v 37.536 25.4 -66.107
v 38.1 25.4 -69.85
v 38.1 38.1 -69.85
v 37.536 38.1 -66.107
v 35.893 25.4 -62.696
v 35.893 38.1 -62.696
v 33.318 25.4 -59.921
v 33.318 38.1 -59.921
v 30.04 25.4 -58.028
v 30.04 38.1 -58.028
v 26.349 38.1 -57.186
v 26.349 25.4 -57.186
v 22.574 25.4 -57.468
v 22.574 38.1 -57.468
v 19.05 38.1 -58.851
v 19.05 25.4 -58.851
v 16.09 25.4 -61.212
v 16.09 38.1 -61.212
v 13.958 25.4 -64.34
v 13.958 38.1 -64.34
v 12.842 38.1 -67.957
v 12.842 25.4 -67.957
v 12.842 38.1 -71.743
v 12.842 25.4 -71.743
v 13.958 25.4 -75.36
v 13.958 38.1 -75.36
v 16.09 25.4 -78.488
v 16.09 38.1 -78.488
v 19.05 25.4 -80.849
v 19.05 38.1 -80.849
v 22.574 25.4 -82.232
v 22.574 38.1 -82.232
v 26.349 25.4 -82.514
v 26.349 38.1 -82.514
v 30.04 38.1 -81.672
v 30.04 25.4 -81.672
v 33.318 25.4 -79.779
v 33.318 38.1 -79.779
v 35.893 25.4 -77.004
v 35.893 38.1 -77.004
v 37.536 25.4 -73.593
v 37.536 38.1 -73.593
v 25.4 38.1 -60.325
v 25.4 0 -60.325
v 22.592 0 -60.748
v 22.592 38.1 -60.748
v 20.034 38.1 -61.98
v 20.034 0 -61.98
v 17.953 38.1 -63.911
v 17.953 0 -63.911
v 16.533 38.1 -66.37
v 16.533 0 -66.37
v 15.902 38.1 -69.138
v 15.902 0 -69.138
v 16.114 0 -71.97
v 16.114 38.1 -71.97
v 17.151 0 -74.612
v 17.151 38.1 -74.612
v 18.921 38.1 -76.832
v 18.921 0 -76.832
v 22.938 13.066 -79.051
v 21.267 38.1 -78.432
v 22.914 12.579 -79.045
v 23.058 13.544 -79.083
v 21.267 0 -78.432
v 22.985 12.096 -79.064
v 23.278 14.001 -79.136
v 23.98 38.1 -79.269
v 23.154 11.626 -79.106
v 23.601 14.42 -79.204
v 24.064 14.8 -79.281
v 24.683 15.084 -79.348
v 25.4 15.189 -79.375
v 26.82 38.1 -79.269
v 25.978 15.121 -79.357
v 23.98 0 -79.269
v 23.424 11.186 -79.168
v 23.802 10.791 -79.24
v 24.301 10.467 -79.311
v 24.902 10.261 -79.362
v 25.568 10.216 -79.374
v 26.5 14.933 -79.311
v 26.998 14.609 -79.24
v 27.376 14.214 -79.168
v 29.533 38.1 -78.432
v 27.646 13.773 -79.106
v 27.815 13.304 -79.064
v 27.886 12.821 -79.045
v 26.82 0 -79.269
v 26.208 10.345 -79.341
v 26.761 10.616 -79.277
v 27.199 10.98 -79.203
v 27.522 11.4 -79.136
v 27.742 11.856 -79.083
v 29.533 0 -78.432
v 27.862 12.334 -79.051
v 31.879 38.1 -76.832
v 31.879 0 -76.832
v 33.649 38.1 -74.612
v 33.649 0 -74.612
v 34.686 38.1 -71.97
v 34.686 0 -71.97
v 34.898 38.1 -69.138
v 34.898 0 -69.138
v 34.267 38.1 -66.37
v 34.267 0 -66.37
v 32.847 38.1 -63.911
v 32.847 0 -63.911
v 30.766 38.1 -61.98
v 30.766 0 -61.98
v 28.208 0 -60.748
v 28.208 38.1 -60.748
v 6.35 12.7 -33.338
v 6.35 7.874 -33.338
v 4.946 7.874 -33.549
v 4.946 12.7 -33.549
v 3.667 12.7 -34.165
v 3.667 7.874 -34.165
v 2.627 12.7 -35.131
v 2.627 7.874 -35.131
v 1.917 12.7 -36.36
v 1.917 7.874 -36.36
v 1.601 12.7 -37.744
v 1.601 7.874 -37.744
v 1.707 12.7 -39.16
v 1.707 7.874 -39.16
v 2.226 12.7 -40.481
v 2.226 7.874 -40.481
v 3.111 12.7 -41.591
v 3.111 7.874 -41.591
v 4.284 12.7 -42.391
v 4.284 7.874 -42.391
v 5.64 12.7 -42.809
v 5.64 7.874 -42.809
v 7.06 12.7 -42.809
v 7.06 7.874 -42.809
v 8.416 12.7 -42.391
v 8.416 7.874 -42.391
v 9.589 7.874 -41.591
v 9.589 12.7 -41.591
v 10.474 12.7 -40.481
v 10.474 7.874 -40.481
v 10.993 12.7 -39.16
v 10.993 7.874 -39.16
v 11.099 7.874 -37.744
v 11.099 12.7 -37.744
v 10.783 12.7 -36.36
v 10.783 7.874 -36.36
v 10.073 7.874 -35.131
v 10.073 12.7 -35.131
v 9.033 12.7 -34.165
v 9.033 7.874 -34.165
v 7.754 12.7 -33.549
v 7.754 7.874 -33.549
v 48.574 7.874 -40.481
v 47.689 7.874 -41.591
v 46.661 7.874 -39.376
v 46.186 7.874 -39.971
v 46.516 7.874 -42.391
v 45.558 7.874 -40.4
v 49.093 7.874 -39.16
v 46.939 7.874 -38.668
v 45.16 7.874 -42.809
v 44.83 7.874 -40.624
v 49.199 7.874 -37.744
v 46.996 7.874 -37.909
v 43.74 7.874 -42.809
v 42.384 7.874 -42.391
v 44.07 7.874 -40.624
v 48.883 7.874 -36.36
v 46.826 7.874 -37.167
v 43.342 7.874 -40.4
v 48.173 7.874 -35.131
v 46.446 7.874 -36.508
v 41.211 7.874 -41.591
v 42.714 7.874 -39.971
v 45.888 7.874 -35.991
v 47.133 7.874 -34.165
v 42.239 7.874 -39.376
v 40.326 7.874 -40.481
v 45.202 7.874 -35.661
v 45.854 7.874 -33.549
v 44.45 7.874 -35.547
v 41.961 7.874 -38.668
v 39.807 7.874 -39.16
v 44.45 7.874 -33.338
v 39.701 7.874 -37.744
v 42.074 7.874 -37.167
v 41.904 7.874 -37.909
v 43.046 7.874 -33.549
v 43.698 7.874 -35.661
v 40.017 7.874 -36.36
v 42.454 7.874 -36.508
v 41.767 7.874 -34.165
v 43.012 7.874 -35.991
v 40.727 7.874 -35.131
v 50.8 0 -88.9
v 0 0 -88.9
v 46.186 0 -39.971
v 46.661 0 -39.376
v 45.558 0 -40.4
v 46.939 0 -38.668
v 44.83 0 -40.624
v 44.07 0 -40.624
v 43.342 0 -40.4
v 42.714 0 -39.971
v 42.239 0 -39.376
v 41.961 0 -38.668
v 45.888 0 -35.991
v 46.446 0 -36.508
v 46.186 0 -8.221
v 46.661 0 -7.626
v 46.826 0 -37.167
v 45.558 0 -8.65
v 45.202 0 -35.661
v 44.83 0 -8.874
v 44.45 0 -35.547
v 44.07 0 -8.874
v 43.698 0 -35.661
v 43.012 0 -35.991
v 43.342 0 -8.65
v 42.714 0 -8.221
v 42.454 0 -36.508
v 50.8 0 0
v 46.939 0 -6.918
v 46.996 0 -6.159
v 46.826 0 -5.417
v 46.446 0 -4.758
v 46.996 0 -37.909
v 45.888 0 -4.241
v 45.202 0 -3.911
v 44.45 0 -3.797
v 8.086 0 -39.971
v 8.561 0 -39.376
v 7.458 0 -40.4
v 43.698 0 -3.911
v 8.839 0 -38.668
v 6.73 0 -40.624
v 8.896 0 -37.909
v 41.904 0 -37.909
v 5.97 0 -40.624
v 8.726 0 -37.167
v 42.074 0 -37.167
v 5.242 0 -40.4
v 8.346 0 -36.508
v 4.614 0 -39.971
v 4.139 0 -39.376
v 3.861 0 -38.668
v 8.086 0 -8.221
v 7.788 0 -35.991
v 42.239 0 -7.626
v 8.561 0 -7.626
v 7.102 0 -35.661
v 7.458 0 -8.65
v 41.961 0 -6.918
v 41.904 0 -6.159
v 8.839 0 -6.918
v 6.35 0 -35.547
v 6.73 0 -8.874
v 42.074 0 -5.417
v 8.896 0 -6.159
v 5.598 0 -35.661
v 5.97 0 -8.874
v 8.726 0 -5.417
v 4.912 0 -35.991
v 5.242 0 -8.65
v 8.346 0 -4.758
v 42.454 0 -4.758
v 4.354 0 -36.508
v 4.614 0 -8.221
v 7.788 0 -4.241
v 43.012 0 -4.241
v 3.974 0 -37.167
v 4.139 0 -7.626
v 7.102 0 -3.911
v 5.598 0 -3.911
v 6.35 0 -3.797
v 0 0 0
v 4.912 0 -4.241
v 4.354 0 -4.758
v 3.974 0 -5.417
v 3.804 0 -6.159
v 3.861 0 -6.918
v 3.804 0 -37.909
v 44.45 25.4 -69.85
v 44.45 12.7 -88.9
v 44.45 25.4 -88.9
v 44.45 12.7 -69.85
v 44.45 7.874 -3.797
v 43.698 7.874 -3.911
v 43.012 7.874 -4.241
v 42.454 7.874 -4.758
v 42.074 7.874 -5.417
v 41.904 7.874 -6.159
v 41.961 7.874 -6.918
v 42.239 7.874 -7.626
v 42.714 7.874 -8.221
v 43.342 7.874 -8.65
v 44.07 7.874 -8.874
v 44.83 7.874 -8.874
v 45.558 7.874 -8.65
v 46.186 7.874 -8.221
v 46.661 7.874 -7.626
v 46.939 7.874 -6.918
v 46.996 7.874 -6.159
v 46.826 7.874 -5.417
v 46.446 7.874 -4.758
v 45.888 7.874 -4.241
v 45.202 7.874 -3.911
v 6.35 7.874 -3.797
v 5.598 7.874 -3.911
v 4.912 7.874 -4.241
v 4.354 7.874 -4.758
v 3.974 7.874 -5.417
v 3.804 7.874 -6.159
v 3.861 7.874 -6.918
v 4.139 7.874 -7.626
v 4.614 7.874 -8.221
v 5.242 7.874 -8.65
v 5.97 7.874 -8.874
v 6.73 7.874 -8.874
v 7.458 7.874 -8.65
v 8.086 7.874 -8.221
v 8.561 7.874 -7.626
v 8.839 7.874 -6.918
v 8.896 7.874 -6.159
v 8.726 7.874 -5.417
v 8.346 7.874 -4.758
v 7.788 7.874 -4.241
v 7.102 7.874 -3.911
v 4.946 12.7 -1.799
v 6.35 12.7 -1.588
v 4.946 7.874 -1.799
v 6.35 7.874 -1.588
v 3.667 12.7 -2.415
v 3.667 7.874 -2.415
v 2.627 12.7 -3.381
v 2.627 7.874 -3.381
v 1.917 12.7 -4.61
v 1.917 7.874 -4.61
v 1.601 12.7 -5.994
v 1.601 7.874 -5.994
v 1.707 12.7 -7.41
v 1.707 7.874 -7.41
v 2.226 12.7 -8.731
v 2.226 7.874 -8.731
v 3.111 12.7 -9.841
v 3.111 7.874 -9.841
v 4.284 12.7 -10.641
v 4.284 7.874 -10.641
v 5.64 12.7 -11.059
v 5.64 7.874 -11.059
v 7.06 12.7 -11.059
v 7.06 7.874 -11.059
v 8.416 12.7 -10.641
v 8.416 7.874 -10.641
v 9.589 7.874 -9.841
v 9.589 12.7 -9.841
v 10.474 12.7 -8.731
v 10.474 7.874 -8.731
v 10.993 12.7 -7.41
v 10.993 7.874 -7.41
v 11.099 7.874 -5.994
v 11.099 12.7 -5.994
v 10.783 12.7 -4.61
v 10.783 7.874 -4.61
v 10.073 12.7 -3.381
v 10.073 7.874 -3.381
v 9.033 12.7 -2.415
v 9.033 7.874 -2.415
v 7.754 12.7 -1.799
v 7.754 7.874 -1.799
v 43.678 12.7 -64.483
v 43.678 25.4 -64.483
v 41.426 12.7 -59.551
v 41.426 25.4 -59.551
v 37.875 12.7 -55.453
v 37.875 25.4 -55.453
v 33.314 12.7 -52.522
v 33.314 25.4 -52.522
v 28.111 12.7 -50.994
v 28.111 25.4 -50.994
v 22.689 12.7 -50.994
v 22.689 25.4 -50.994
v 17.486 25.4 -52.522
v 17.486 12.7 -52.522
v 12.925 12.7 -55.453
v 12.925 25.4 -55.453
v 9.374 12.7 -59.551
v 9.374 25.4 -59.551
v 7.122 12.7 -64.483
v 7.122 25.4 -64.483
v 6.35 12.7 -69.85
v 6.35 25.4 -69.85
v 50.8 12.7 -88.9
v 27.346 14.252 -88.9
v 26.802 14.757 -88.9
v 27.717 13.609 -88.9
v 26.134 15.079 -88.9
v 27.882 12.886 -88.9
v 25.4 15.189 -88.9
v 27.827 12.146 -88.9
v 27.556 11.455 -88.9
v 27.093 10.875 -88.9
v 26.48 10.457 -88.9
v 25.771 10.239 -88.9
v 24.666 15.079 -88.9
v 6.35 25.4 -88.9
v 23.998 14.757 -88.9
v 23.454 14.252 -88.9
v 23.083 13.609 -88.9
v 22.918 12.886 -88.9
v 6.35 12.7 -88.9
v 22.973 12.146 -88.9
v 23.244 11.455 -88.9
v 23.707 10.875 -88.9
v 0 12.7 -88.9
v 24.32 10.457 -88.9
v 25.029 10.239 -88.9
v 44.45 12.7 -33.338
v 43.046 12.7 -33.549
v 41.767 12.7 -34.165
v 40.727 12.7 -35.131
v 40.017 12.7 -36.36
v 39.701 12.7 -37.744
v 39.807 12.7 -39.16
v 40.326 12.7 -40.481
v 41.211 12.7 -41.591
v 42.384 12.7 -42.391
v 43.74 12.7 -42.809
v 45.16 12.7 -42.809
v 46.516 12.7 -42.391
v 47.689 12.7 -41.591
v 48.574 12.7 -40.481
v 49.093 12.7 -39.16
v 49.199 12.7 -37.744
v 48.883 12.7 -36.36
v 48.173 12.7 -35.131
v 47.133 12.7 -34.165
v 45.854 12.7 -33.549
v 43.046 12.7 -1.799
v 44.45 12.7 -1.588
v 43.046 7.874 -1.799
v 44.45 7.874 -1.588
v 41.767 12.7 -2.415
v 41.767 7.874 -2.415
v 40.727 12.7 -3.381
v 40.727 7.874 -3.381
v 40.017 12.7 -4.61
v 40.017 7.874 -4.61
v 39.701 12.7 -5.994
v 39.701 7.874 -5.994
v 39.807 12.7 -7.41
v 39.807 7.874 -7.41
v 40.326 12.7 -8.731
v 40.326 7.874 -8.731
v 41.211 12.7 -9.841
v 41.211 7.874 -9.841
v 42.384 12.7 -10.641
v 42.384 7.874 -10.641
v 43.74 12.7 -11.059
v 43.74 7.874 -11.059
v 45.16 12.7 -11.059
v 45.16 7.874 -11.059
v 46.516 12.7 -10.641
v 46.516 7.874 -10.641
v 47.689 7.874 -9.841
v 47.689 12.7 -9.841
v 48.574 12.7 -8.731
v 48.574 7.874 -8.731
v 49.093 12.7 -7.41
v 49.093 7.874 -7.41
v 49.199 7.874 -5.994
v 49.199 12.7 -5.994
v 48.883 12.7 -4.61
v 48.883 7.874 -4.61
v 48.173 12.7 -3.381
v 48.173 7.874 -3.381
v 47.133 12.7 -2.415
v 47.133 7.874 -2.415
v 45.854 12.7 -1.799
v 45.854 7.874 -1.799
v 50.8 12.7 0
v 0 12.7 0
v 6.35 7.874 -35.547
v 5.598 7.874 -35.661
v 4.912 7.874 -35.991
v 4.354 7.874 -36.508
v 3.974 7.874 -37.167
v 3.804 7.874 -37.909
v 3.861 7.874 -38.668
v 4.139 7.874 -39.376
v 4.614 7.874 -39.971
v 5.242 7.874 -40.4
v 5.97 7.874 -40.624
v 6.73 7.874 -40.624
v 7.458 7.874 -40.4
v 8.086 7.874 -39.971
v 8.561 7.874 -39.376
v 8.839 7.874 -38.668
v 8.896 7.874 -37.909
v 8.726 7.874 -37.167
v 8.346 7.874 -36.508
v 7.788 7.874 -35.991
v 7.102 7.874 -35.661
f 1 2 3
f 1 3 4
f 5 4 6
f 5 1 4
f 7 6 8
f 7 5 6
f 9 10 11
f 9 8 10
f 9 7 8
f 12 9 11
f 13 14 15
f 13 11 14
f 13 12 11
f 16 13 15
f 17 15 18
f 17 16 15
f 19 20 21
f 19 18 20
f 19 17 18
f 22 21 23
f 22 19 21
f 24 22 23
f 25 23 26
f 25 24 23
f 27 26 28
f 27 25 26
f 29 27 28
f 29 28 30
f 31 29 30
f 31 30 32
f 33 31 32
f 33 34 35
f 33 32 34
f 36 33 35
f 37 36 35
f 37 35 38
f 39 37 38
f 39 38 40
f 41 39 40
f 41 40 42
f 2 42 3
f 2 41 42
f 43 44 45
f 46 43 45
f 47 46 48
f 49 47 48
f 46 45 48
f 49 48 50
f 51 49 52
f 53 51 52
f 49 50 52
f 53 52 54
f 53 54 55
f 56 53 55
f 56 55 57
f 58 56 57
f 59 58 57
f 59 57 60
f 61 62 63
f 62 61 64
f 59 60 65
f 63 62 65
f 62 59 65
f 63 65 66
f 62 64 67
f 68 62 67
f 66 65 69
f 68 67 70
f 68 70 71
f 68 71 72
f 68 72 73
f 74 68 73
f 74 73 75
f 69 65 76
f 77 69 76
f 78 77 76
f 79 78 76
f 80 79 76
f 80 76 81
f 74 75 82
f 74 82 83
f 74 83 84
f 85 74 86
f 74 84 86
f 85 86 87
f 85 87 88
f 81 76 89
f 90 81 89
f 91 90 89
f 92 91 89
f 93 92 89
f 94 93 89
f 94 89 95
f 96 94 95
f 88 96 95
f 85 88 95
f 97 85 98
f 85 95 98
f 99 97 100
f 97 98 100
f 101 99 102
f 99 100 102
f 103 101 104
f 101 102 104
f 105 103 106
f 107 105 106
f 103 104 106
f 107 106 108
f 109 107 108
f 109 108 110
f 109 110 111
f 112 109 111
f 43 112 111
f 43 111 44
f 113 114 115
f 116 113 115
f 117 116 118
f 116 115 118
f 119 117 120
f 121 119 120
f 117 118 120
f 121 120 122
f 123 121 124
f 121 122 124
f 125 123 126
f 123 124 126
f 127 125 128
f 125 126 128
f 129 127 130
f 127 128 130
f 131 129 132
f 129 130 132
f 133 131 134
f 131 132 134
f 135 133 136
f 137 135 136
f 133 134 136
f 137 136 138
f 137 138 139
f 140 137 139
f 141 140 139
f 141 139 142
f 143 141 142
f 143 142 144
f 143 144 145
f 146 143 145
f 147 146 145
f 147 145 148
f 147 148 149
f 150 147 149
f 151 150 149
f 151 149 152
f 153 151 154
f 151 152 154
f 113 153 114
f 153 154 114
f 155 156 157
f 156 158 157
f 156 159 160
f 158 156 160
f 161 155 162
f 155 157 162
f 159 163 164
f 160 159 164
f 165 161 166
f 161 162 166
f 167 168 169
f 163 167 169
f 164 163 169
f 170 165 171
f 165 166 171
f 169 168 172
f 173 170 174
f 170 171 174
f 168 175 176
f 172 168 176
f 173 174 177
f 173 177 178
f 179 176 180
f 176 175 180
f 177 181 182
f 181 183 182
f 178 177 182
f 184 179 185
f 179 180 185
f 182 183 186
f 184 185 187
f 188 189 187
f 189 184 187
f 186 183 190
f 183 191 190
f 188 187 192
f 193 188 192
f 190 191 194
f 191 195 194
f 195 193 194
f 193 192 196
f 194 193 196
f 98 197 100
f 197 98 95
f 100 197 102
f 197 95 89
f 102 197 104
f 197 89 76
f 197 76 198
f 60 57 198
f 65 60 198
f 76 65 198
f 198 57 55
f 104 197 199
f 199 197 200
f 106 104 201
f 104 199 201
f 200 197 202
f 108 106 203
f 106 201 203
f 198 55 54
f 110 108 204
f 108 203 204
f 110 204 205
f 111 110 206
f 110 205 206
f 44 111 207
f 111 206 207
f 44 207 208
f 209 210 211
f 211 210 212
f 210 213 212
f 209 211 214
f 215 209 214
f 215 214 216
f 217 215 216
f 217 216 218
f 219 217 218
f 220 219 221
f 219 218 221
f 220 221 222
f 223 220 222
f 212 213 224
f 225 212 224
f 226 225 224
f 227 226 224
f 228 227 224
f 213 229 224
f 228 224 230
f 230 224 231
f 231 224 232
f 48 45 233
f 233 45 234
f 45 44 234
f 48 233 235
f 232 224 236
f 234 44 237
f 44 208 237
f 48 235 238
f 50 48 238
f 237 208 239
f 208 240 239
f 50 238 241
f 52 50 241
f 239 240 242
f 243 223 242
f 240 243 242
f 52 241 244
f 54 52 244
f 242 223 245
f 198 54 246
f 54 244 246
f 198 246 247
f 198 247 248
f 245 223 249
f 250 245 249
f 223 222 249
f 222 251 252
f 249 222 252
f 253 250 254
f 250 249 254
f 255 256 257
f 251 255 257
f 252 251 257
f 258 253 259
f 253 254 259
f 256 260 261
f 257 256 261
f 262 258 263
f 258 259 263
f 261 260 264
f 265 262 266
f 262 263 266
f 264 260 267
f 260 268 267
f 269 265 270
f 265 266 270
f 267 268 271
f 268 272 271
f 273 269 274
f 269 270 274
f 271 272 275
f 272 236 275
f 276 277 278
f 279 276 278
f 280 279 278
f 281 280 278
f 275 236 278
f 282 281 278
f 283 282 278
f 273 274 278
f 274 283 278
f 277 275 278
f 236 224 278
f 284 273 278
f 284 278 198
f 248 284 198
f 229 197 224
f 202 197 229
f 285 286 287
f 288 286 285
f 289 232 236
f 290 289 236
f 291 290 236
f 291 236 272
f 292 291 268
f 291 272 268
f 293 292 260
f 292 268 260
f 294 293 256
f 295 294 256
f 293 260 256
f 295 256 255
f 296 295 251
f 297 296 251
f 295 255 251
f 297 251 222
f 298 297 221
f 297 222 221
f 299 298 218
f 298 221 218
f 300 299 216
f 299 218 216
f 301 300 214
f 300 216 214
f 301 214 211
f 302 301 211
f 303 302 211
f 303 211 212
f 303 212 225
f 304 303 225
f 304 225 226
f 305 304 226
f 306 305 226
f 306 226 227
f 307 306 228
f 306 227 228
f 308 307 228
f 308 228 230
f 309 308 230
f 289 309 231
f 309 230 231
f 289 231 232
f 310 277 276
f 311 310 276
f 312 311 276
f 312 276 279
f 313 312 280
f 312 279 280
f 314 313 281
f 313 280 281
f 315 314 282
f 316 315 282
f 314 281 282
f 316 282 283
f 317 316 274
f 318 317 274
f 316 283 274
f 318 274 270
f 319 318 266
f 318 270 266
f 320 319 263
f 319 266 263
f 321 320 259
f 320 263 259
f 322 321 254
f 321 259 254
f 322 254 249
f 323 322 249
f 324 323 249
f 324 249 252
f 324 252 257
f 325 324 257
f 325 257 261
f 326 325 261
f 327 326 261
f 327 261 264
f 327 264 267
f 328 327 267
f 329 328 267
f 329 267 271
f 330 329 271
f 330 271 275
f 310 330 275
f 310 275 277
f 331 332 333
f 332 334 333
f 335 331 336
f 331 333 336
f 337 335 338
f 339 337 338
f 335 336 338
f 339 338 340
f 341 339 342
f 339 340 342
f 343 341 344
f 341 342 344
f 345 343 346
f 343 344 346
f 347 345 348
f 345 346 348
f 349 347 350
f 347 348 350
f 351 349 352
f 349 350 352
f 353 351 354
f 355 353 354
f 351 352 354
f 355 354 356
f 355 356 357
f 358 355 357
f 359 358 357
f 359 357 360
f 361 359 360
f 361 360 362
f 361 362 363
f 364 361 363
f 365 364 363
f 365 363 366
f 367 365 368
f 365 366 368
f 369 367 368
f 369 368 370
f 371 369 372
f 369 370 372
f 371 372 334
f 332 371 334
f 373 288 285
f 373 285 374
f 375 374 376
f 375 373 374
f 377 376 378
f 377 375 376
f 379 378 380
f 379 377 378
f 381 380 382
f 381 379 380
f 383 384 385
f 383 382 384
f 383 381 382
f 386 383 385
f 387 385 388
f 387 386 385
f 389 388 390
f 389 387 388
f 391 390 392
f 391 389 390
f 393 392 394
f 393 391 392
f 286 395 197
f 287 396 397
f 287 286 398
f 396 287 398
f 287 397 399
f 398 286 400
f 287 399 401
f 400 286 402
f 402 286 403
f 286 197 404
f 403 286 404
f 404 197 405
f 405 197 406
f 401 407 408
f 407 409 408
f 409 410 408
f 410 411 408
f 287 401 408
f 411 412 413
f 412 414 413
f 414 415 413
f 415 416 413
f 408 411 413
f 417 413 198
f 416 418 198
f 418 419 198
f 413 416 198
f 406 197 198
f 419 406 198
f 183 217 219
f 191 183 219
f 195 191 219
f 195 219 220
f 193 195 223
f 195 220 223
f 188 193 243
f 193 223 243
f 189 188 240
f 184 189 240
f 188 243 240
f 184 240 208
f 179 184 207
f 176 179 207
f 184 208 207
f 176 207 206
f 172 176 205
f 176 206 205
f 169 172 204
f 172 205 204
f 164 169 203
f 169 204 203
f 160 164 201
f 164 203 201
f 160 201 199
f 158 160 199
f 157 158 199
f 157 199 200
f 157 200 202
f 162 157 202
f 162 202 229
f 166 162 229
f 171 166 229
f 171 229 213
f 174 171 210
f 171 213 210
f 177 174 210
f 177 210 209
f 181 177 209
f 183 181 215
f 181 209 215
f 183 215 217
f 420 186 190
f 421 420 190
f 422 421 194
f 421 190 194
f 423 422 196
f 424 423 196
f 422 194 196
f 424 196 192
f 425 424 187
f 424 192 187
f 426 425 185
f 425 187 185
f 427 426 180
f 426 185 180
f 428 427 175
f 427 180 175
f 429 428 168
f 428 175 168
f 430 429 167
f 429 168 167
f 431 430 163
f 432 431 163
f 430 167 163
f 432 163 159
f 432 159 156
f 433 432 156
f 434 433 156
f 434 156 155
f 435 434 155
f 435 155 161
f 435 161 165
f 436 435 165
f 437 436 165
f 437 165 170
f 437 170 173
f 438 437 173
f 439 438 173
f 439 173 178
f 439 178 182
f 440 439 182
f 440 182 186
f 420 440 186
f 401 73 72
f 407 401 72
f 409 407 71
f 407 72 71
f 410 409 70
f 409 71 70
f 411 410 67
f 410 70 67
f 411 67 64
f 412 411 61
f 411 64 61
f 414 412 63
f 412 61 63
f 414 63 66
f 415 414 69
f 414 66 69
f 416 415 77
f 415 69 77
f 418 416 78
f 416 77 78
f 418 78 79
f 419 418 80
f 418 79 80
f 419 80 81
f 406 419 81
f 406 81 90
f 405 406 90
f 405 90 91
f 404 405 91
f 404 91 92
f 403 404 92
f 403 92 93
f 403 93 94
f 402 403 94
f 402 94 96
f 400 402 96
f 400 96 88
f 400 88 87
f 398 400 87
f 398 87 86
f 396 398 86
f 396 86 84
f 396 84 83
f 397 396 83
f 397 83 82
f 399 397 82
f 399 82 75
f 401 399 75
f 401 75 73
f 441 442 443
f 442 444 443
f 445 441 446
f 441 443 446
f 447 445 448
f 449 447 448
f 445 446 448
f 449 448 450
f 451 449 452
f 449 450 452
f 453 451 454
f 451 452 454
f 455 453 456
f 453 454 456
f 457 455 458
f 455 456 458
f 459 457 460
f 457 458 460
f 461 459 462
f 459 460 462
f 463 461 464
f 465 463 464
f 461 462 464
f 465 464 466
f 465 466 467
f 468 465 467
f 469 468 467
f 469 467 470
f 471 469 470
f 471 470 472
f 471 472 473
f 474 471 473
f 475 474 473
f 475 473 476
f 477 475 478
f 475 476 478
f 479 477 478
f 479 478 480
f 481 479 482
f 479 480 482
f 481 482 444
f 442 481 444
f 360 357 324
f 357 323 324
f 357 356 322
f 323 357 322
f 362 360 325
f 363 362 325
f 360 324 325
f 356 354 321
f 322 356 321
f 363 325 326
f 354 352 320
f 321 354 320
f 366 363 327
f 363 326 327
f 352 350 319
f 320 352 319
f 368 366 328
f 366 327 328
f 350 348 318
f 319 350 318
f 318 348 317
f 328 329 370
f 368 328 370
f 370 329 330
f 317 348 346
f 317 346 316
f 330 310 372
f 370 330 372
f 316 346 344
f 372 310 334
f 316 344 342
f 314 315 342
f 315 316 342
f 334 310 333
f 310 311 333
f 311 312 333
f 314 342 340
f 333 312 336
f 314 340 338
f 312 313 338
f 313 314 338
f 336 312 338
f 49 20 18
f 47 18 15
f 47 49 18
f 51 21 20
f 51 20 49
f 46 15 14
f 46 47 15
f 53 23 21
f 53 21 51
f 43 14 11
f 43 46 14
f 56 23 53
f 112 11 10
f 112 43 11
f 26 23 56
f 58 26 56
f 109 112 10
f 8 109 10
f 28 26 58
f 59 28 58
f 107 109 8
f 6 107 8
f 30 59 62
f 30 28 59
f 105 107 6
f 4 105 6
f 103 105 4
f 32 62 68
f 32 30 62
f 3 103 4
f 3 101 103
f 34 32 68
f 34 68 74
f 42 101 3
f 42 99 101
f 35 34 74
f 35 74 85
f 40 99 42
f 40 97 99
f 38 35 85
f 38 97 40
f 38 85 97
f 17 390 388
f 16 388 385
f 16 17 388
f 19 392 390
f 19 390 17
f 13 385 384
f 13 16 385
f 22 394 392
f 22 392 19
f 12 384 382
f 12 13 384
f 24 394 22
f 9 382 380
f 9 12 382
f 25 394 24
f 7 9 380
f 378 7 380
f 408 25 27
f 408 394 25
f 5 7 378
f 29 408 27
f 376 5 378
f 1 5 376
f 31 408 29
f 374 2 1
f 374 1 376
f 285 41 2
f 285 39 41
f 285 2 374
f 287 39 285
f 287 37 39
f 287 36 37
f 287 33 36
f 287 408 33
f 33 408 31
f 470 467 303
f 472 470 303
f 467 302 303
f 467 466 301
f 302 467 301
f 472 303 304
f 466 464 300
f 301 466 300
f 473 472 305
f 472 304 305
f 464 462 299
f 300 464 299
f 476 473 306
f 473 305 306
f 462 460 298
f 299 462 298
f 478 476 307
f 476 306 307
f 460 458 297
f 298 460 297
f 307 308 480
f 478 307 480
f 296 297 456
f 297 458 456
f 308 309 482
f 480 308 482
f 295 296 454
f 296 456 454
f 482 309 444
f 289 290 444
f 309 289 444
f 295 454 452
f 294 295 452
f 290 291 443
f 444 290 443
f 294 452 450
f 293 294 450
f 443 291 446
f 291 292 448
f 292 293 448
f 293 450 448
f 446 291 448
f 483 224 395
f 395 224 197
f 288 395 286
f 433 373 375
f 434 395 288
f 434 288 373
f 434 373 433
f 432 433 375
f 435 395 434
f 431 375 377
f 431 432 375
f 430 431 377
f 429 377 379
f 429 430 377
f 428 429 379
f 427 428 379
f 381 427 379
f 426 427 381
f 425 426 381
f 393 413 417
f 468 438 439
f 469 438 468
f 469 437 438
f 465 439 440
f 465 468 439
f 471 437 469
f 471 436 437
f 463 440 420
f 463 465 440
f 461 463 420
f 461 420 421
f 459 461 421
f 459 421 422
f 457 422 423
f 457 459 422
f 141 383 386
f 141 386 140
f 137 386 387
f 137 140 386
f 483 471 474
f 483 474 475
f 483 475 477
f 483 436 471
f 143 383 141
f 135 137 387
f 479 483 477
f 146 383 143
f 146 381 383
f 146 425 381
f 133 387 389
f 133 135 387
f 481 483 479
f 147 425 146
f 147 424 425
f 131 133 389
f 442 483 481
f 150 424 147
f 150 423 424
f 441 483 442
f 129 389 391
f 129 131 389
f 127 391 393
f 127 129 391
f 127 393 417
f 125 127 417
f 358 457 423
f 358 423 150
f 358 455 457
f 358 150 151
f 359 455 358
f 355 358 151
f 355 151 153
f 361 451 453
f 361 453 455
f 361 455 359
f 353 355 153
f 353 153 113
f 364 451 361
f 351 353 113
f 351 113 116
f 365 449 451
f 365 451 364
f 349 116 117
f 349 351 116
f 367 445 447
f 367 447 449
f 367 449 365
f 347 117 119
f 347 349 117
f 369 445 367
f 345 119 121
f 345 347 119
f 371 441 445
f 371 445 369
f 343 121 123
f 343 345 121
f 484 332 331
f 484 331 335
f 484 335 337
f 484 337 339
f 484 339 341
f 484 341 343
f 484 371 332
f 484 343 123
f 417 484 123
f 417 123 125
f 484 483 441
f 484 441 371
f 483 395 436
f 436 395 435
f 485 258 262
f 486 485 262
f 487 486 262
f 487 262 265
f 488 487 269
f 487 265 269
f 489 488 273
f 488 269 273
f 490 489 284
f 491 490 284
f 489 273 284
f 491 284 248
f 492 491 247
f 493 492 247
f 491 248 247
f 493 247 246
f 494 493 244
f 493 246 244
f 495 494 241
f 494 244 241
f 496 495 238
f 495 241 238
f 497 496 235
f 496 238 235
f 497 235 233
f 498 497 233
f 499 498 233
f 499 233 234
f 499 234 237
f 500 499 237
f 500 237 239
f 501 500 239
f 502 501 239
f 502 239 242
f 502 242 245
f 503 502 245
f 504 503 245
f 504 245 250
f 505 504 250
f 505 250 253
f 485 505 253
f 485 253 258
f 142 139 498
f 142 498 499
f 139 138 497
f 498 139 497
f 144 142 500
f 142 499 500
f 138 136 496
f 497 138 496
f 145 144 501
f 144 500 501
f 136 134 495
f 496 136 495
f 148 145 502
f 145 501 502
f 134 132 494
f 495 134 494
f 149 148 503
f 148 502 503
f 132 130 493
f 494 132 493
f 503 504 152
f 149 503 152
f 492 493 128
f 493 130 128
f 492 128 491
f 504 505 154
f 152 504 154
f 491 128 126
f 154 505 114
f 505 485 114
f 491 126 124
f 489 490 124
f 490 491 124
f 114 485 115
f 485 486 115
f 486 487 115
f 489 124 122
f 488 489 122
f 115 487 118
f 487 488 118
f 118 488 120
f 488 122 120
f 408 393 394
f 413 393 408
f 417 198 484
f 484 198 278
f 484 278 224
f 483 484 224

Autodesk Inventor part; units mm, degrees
ref_plane "YZ Plane" through (0, 0, 0) normal (1, 0, 0) x (0, 1, 0)
ref_plane "XZ Plane" through (0, 0, 0) normal (0, 1, 0) x (-1, 0, 0)
ref_plane "XY Plane" through (0, 0, 0) normal (0, 0, 1) x (1, 0, 0)
sketch "Sketch1" plane through (0, 0, 0) normal (0, 1, 0) x (-1, 0, 0)
  line L0 (0, 0) -> (-50.8, 0)
  line L1 (-50.8, 0) -> (-50.8, -88.9)
  line L2 (-50.8, -88.9) -> (0, -88.9)
  line L3 (0, -88.9) -> (0, 0)
  dimension "d0" = 50.8
  dimension "d1" = 88.9
extrude "Extrusion1" add sketch "Sketch1" along normal blind 12.7
sketch "Sketch2" plane through (0, 12.7, 0) normal (0, 1, 0) x (1, 0, 0)
  line L0 (50.8, 0) -> (50.8, 88.9) projected
  line L1 (50.8, 88.9) -> (0, 88.9) projected
  line L2 (0, 88.9) -> (0, 0) projected
  line L3 (6.35, 88.9) -> (44.45, 88.9)
  line L4 (44.45, 88.9) -> (44.45, 69.85)
  line L5 (44.45, 69.85) -> (6.35, 69.85)
  line L6 (6.35, 69.85) -> (6.35, 88.9)
  line L7 (6.35, 79.375) -> (0, 79.375) construction
  line L8 (44.45, 79.375) -> (50.8, 79.375) construction
  circle A0 centre (25.4, 69.85) radius 19.05
  dimension "d4" = 19.05
  dimension "d5" = 6.35
extrude "Extrusion2" add sketch "Sketch2" along normal blind 12.7
sketch "Sketch3" plane through (0, 25.4, 0) normal (0, 1, 0) x (1, 0, 0)
  arc A0 (6.35, 69.85) -> (44.45, 69.85) centre (25.4, 69.85) ccw projected
  circle A1 centre (25.4, 69.85) radius 12.7
  point P0 (0, 0)
  dimension "d8" = 25.4
extrude "Extrusion3" add sketch "Sketch3" along normal blind 12.7
sketch "Sketch6" plane through (0, 12.7, 0) normal (0, 1, 0) x (1, 0, 0)
  line L0 (0, 88.9) -> (0, 0) projected
  line L1 (0, 0) -> (50.8, 0) projected
  line L2 (50.8, 0) -> (50.8, 88.9) projected
  line L3 (44.45, 88.9) -> (44.45, 6.35) construction
  line L4 (44.45, 6.35) -> (6.35, 6.35) construction
  line L5 (6.35, 6.35) -> (6.35, 88.9) construction
  line L6 (6.35, 38.1) -> (44.45, 38.1) construction
  dimension "d35" = 6.35
  dimension "d36" = 31.75
hole "Hole3" at (25.4, 38.1, -69.85) direction (0, -1, 0) diameter 19.05 end through all
sketch "Sketch7" plane through (50.8, 0, -88.9) normal (0, 0, -1) x (-1, 0, 0)
  line L0 (0, 0) -> (0, 12.7) projected
  line L1 (44.45, 12.7) -> (6.35, 12.7) construction
  point P0 (25.4, 12.7)
hole "Hole4" at (25.4, 12.7, -88.9) direction (0, 0, 1) diameter 4.9784 end up to surface thread size "1/4-20 UNC" class "2B" standard "ANSI Unified Screw Threads"
hole "Hole5" at (6.35, 12.7, -6.35) at (6.35, 12.7, -38.1) at (44.45, 12.7, -6.35) at (44.45, 12.7, -38.1) direction (0, -1, 0) diameter 5.1054 end through all counterbore diameter 9.525 counterbore depth 4.826 clearance for "Socket Head Cap Screw" size "#10" standard "Ansi Unified Screw Threads"
properties part number "Holes Complete"
